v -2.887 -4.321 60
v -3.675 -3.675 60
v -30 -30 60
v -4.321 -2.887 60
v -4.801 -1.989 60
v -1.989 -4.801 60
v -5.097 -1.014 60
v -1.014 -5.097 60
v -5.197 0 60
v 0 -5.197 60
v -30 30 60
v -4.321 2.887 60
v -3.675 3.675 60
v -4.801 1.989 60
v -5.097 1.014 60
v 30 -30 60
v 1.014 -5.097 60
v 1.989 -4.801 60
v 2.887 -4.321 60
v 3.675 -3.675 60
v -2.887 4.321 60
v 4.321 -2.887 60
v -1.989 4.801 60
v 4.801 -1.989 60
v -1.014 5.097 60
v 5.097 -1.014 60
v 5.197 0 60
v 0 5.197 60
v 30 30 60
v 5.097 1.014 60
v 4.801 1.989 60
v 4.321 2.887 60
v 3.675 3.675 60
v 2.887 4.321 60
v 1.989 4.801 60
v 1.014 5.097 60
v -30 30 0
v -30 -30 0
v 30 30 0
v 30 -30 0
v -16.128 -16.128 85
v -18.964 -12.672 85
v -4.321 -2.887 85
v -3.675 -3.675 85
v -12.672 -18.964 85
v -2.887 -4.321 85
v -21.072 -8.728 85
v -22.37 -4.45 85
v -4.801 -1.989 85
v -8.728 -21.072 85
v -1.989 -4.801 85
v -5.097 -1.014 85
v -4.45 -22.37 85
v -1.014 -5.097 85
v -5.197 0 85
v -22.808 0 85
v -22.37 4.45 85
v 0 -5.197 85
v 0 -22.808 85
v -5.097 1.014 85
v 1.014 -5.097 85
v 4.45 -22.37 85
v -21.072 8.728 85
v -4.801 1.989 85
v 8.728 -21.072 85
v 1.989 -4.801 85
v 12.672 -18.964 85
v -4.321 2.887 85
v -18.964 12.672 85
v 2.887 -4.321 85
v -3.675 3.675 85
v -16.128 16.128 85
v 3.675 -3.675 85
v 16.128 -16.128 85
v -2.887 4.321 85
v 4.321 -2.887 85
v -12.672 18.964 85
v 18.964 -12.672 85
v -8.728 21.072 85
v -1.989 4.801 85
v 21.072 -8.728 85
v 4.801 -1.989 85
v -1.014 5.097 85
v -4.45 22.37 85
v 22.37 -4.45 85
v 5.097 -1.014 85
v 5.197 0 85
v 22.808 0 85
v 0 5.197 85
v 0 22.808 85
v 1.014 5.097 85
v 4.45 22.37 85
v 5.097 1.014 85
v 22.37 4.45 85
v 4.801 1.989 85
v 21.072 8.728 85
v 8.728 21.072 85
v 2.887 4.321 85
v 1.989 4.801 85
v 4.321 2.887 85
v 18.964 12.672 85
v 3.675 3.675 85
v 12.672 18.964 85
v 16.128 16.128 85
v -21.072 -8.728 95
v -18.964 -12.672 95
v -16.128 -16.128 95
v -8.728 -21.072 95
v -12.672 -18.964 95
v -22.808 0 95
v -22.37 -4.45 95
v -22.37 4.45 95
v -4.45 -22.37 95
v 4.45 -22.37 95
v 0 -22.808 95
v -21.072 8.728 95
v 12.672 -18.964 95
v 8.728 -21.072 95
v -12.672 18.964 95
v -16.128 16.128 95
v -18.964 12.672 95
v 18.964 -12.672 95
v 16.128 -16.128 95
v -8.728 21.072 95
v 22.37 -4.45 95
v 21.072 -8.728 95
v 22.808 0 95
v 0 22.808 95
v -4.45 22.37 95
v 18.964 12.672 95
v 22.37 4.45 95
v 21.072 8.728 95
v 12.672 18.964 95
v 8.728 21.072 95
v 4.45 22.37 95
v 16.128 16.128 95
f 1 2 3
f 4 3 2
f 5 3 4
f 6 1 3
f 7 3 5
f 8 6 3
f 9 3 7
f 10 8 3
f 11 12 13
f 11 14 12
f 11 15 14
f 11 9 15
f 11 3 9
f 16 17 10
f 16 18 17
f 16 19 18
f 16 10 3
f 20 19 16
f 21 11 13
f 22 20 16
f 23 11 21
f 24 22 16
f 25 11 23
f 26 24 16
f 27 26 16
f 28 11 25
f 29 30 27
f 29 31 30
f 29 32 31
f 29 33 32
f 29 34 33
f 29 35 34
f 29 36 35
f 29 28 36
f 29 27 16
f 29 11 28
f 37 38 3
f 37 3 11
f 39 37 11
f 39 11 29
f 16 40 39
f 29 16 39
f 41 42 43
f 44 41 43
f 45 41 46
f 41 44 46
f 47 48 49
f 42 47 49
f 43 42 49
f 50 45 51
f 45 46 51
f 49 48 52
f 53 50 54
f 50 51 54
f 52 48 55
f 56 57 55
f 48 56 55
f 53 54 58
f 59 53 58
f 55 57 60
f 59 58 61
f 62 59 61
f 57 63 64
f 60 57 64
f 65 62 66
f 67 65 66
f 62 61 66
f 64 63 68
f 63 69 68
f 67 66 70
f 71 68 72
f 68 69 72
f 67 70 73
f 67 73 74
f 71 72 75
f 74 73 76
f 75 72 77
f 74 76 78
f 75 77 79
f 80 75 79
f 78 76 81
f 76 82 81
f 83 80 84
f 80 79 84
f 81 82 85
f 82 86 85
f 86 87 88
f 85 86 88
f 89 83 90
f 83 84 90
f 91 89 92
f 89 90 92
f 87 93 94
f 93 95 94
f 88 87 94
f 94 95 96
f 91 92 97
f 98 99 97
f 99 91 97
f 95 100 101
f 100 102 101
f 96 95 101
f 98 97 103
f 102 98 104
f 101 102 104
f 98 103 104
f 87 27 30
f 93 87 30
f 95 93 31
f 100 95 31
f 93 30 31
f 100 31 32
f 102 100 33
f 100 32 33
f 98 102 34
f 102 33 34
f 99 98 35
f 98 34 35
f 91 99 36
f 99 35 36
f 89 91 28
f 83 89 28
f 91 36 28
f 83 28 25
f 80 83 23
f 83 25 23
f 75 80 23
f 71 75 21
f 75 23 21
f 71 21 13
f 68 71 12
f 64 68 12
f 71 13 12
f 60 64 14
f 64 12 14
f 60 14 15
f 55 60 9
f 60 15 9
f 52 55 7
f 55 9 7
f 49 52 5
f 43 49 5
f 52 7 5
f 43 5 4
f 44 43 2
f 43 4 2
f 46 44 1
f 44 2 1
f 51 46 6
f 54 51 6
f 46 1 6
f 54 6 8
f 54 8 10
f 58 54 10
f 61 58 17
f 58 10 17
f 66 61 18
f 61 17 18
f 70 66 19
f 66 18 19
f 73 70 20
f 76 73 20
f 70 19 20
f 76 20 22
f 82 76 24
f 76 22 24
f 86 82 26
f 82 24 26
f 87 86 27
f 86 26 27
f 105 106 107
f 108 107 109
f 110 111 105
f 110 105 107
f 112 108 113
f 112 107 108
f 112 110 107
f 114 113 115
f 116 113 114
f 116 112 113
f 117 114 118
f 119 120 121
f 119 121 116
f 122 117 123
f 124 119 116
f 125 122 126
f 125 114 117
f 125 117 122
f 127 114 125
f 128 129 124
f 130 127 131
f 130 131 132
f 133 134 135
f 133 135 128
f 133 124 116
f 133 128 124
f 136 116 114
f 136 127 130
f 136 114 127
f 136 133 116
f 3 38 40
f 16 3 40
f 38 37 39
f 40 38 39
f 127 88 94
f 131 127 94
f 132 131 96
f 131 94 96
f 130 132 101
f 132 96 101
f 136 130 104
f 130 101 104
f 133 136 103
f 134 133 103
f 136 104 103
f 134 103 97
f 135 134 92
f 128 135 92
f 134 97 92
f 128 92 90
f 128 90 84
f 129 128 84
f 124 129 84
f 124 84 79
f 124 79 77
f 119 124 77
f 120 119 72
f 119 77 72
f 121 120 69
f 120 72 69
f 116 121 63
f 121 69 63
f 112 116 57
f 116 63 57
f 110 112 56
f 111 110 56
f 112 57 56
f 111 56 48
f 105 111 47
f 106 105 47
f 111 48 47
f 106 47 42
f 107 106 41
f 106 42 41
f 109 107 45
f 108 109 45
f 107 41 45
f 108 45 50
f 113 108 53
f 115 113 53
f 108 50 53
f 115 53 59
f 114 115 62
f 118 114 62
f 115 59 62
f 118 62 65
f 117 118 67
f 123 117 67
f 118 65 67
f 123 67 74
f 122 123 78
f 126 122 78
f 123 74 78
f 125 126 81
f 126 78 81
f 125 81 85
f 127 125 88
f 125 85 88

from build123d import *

# Parameters (mm, degrees)
F0_W     = 60
F0_H     = 60
F1_DEPTH = 60
F2_R     = 5.197048
F3_DEPTH = 25
F4_R     = 22.808201
F5_DEPTH = 10


with BuildPart() as f1:
    # F0 (on Top) → F1 (new body)
    with BuildSketch(Plane.XY):
        Rectangle(F0_W, F0_H)
    extrude(amount=F1_DEPTH)

    # F2 (on face) → F3 (join)
    with BuildSketch(Plane.XY.offset(60)):
        Circle(F2_R)
    extrude(amount=F3_DEPTH)

    # F4 (on face) → F5 (join)
    with BuildSketch(Plane.XY.offset(85)):
        Circle(F4_R)
    extrude(amount=F5_DEPTH)


solid = f1.part
